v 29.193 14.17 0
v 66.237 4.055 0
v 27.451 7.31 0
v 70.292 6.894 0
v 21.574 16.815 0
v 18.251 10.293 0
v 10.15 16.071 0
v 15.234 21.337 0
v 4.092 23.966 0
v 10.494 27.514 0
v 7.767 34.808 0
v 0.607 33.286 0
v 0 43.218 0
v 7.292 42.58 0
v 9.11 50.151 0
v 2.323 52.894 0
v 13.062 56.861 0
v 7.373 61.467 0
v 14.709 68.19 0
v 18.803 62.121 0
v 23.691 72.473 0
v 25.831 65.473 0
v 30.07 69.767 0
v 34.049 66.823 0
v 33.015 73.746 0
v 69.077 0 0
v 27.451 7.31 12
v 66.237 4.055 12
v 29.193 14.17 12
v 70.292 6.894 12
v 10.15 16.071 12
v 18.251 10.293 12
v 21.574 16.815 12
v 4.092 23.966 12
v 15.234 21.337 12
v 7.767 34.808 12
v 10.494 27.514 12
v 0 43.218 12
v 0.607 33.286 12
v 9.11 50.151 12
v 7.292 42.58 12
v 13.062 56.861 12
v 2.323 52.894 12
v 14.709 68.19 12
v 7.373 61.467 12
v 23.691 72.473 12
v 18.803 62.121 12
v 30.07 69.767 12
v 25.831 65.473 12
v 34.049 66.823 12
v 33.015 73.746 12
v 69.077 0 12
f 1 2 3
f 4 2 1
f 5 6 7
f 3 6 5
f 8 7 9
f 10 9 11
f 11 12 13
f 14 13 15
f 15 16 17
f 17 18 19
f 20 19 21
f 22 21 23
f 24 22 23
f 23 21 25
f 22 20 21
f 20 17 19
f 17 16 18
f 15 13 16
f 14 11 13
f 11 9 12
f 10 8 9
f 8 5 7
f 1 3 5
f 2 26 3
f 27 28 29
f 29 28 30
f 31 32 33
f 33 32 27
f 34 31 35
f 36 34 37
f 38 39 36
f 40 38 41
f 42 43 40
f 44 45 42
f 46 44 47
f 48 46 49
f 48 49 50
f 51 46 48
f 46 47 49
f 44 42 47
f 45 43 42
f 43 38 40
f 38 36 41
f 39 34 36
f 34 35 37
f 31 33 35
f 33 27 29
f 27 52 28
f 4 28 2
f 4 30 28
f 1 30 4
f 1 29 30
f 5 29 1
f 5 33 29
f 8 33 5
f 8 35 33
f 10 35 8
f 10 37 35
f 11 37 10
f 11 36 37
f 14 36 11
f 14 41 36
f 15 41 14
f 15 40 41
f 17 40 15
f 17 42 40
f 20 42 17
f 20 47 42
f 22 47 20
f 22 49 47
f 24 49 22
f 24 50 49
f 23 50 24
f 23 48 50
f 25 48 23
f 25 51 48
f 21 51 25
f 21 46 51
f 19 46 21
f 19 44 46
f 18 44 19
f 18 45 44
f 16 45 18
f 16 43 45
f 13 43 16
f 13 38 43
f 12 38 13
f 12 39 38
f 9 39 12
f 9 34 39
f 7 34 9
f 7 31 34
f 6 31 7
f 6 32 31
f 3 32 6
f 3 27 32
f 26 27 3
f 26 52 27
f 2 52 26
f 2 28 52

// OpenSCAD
$fn = 32;

// ----------------------------------------------------------------------
// Hook plate: curl radius 30 mm over 170 degrees, 7 mm thick band
// ----------------------------------------------------------------------

// --- parameters (mm) ---
profile_height = 12;      // extrusion height
profile_points = 26;      // points of the closed outline

profile = [[30.07, 69.767], [33.015, 73.746], [23.691, 72.473], [14.709, 68.19], [7.373, 61.467], [2.323, 52.894], [0, 43.218], [0.607, 33.286], [4.092, 23.966], [10.15, 16.071], [18.251, 10.293], [27.451, 7.31], [69.077, 0], [66.237, 4.055], [70.292, 6.894], [29.193, 14.17], [21.574, 16.815], [15.234, 21.337], [10.494, 27.514], [7.767, 34.808], [7.292, 42.58], [9.11, 50.151], [13.062, 56.861], [18.803, 62.121], [25.831, 65.473], [34.049, 66.823]];  // single closed polygon, 26 points, counter clockwise

// --- the one profile operation ---
linear_extrude(height = profile_height) polygon(points = profile);
